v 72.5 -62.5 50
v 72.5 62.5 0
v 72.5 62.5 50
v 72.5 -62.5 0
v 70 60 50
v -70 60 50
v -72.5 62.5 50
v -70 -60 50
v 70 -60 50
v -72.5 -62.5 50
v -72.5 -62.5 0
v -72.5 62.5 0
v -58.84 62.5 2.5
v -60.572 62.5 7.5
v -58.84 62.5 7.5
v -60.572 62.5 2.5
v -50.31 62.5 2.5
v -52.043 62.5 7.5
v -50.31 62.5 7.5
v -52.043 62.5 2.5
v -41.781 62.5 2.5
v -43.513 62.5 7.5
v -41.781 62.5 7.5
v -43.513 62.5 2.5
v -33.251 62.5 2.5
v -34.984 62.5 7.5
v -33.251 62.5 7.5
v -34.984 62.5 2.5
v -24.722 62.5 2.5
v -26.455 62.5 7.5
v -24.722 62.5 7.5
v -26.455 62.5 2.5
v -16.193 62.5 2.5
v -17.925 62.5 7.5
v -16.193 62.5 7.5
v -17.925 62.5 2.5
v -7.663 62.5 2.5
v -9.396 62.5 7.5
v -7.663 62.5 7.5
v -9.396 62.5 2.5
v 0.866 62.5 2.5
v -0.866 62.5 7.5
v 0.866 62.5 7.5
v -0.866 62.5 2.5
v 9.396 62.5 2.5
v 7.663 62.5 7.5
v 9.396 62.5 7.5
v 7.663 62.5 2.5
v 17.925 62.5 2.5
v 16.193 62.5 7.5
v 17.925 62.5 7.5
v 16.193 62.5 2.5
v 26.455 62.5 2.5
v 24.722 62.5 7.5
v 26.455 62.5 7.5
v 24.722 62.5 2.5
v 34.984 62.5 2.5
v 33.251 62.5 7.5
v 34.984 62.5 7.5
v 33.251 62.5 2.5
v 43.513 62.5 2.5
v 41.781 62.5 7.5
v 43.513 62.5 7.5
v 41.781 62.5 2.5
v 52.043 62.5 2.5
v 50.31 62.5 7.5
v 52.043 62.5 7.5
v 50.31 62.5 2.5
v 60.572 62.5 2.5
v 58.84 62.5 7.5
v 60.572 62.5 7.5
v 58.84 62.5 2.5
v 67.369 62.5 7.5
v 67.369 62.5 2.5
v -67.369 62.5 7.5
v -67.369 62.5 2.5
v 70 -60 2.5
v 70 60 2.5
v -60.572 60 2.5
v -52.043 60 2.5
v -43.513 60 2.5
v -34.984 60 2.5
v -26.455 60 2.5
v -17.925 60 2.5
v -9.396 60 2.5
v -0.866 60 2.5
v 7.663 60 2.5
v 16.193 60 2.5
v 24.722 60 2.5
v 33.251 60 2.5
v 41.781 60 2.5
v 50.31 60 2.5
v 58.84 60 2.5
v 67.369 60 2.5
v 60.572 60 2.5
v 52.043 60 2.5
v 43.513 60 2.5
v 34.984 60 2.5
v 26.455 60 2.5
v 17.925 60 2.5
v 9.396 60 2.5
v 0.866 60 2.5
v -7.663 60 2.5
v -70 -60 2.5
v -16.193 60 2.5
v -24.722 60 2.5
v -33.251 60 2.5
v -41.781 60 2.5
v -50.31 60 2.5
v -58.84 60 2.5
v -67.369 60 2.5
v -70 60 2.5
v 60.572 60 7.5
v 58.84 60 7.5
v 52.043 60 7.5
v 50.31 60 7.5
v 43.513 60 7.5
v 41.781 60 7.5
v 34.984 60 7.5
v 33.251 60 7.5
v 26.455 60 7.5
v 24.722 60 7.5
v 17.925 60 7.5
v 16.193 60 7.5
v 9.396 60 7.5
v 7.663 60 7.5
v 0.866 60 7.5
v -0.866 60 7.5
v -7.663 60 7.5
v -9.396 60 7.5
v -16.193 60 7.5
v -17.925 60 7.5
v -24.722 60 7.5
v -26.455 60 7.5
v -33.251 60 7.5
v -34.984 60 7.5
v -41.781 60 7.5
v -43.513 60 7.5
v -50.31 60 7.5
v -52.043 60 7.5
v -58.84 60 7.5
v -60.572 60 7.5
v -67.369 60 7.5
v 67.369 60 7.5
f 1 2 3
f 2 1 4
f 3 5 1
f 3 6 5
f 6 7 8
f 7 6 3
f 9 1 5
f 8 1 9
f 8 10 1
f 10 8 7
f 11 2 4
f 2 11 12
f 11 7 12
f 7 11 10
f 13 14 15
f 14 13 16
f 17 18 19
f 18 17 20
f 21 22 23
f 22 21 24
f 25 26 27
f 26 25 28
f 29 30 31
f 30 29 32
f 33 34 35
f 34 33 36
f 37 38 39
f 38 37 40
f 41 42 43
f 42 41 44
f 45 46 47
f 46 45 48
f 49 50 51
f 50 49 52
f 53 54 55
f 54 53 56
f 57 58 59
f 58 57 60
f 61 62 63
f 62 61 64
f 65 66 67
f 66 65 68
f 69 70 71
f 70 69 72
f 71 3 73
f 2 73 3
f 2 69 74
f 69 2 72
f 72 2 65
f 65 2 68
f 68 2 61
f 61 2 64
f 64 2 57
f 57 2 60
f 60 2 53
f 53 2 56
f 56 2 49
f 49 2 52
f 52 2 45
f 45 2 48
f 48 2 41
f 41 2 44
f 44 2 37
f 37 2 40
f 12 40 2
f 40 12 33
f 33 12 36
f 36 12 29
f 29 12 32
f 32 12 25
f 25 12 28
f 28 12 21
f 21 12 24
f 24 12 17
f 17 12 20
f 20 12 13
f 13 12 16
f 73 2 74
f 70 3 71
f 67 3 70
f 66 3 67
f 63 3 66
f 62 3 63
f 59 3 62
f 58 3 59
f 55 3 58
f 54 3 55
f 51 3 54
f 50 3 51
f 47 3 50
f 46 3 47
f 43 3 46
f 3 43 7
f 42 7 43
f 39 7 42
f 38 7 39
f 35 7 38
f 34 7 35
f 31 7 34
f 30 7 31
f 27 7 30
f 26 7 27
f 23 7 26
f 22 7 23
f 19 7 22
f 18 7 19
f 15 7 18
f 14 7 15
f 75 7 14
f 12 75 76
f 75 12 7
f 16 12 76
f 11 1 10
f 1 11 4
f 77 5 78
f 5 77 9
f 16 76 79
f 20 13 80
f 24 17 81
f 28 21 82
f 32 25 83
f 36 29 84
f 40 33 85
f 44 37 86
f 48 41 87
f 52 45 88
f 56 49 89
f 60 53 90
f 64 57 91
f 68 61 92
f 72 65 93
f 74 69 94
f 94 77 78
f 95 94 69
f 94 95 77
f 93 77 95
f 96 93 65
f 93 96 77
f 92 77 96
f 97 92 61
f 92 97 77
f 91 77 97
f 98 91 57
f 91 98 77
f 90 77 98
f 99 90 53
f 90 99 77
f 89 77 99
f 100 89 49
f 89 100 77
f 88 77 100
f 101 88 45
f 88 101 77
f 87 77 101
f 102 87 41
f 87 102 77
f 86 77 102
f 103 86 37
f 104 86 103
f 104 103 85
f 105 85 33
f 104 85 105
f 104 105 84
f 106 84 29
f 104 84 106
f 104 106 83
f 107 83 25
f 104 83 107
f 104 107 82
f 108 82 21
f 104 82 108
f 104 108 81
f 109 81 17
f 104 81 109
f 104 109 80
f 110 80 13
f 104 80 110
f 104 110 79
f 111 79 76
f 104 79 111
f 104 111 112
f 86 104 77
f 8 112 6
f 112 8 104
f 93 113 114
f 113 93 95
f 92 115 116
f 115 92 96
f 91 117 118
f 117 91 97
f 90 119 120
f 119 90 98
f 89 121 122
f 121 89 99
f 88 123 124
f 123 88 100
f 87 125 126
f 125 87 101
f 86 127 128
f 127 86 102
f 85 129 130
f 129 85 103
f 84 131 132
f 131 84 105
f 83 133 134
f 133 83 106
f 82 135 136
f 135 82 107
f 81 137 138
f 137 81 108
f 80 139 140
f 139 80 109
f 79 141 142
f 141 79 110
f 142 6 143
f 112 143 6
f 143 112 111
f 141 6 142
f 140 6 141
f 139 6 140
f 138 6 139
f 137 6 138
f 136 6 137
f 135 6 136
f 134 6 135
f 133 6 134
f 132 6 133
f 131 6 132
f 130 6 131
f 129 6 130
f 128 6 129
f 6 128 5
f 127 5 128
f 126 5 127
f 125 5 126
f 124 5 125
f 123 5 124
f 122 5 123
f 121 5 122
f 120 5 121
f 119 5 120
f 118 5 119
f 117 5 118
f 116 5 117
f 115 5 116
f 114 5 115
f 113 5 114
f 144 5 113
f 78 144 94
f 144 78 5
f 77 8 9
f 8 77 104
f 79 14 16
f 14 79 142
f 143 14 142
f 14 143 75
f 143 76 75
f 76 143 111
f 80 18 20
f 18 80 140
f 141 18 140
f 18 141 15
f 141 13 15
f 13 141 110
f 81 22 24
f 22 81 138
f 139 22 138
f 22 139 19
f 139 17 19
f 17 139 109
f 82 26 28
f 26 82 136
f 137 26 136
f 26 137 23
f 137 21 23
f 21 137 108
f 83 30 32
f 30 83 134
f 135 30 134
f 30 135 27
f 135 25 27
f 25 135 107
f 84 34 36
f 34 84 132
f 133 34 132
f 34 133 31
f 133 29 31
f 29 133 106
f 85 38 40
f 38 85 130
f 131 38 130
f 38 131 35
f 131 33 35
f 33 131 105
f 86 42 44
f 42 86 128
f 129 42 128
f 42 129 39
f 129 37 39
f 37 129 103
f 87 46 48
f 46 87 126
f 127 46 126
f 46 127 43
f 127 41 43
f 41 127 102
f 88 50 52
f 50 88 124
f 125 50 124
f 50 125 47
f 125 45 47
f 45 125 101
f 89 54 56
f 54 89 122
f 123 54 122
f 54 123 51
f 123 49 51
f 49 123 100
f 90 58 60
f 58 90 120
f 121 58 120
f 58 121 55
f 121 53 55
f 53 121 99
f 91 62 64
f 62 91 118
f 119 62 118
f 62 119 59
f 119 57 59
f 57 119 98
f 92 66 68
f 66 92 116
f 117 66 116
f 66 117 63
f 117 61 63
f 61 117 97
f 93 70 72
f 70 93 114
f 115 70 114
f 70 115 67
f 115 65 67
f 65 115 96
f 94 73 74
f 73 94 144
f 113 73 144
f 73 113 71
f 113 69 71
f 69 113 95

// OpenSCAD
dust_bin();

module dust_bin(width=145, length=125, depth=50, thickness=2.5)
{
    difference()
    {
        translate([0,0,depth/2])
        difference()
        {
            cube([width, length, depth], center=true);
            
            negative_width = width - thickness*2;
            negative_length = length - thickness*2;
            negative_depth = depth - thickness;
            
            translate([0,0,thickness/2])
            cube([negative_width, negative_length, negative_depth], center=true);
        }
        
        aperture(width=width, thickness=thickness, y_offset=length/2);
    }
}

module aperture(width=150, height=5, open_ratio=.75, num_openings=16, thickness=2.5, y_offset=62.5)
{
    hole_width = (width * open_ratio) / num_openings;
    spacing = width / (num_openings + 1);
    
    for (x = [1:num_openings])
    {
        translate([-width/2 + x*spacing,y_offset - thickness/2,height/2 + thickness])
        cube([hole_width, thickness*4, height], center=true);
    }
}
